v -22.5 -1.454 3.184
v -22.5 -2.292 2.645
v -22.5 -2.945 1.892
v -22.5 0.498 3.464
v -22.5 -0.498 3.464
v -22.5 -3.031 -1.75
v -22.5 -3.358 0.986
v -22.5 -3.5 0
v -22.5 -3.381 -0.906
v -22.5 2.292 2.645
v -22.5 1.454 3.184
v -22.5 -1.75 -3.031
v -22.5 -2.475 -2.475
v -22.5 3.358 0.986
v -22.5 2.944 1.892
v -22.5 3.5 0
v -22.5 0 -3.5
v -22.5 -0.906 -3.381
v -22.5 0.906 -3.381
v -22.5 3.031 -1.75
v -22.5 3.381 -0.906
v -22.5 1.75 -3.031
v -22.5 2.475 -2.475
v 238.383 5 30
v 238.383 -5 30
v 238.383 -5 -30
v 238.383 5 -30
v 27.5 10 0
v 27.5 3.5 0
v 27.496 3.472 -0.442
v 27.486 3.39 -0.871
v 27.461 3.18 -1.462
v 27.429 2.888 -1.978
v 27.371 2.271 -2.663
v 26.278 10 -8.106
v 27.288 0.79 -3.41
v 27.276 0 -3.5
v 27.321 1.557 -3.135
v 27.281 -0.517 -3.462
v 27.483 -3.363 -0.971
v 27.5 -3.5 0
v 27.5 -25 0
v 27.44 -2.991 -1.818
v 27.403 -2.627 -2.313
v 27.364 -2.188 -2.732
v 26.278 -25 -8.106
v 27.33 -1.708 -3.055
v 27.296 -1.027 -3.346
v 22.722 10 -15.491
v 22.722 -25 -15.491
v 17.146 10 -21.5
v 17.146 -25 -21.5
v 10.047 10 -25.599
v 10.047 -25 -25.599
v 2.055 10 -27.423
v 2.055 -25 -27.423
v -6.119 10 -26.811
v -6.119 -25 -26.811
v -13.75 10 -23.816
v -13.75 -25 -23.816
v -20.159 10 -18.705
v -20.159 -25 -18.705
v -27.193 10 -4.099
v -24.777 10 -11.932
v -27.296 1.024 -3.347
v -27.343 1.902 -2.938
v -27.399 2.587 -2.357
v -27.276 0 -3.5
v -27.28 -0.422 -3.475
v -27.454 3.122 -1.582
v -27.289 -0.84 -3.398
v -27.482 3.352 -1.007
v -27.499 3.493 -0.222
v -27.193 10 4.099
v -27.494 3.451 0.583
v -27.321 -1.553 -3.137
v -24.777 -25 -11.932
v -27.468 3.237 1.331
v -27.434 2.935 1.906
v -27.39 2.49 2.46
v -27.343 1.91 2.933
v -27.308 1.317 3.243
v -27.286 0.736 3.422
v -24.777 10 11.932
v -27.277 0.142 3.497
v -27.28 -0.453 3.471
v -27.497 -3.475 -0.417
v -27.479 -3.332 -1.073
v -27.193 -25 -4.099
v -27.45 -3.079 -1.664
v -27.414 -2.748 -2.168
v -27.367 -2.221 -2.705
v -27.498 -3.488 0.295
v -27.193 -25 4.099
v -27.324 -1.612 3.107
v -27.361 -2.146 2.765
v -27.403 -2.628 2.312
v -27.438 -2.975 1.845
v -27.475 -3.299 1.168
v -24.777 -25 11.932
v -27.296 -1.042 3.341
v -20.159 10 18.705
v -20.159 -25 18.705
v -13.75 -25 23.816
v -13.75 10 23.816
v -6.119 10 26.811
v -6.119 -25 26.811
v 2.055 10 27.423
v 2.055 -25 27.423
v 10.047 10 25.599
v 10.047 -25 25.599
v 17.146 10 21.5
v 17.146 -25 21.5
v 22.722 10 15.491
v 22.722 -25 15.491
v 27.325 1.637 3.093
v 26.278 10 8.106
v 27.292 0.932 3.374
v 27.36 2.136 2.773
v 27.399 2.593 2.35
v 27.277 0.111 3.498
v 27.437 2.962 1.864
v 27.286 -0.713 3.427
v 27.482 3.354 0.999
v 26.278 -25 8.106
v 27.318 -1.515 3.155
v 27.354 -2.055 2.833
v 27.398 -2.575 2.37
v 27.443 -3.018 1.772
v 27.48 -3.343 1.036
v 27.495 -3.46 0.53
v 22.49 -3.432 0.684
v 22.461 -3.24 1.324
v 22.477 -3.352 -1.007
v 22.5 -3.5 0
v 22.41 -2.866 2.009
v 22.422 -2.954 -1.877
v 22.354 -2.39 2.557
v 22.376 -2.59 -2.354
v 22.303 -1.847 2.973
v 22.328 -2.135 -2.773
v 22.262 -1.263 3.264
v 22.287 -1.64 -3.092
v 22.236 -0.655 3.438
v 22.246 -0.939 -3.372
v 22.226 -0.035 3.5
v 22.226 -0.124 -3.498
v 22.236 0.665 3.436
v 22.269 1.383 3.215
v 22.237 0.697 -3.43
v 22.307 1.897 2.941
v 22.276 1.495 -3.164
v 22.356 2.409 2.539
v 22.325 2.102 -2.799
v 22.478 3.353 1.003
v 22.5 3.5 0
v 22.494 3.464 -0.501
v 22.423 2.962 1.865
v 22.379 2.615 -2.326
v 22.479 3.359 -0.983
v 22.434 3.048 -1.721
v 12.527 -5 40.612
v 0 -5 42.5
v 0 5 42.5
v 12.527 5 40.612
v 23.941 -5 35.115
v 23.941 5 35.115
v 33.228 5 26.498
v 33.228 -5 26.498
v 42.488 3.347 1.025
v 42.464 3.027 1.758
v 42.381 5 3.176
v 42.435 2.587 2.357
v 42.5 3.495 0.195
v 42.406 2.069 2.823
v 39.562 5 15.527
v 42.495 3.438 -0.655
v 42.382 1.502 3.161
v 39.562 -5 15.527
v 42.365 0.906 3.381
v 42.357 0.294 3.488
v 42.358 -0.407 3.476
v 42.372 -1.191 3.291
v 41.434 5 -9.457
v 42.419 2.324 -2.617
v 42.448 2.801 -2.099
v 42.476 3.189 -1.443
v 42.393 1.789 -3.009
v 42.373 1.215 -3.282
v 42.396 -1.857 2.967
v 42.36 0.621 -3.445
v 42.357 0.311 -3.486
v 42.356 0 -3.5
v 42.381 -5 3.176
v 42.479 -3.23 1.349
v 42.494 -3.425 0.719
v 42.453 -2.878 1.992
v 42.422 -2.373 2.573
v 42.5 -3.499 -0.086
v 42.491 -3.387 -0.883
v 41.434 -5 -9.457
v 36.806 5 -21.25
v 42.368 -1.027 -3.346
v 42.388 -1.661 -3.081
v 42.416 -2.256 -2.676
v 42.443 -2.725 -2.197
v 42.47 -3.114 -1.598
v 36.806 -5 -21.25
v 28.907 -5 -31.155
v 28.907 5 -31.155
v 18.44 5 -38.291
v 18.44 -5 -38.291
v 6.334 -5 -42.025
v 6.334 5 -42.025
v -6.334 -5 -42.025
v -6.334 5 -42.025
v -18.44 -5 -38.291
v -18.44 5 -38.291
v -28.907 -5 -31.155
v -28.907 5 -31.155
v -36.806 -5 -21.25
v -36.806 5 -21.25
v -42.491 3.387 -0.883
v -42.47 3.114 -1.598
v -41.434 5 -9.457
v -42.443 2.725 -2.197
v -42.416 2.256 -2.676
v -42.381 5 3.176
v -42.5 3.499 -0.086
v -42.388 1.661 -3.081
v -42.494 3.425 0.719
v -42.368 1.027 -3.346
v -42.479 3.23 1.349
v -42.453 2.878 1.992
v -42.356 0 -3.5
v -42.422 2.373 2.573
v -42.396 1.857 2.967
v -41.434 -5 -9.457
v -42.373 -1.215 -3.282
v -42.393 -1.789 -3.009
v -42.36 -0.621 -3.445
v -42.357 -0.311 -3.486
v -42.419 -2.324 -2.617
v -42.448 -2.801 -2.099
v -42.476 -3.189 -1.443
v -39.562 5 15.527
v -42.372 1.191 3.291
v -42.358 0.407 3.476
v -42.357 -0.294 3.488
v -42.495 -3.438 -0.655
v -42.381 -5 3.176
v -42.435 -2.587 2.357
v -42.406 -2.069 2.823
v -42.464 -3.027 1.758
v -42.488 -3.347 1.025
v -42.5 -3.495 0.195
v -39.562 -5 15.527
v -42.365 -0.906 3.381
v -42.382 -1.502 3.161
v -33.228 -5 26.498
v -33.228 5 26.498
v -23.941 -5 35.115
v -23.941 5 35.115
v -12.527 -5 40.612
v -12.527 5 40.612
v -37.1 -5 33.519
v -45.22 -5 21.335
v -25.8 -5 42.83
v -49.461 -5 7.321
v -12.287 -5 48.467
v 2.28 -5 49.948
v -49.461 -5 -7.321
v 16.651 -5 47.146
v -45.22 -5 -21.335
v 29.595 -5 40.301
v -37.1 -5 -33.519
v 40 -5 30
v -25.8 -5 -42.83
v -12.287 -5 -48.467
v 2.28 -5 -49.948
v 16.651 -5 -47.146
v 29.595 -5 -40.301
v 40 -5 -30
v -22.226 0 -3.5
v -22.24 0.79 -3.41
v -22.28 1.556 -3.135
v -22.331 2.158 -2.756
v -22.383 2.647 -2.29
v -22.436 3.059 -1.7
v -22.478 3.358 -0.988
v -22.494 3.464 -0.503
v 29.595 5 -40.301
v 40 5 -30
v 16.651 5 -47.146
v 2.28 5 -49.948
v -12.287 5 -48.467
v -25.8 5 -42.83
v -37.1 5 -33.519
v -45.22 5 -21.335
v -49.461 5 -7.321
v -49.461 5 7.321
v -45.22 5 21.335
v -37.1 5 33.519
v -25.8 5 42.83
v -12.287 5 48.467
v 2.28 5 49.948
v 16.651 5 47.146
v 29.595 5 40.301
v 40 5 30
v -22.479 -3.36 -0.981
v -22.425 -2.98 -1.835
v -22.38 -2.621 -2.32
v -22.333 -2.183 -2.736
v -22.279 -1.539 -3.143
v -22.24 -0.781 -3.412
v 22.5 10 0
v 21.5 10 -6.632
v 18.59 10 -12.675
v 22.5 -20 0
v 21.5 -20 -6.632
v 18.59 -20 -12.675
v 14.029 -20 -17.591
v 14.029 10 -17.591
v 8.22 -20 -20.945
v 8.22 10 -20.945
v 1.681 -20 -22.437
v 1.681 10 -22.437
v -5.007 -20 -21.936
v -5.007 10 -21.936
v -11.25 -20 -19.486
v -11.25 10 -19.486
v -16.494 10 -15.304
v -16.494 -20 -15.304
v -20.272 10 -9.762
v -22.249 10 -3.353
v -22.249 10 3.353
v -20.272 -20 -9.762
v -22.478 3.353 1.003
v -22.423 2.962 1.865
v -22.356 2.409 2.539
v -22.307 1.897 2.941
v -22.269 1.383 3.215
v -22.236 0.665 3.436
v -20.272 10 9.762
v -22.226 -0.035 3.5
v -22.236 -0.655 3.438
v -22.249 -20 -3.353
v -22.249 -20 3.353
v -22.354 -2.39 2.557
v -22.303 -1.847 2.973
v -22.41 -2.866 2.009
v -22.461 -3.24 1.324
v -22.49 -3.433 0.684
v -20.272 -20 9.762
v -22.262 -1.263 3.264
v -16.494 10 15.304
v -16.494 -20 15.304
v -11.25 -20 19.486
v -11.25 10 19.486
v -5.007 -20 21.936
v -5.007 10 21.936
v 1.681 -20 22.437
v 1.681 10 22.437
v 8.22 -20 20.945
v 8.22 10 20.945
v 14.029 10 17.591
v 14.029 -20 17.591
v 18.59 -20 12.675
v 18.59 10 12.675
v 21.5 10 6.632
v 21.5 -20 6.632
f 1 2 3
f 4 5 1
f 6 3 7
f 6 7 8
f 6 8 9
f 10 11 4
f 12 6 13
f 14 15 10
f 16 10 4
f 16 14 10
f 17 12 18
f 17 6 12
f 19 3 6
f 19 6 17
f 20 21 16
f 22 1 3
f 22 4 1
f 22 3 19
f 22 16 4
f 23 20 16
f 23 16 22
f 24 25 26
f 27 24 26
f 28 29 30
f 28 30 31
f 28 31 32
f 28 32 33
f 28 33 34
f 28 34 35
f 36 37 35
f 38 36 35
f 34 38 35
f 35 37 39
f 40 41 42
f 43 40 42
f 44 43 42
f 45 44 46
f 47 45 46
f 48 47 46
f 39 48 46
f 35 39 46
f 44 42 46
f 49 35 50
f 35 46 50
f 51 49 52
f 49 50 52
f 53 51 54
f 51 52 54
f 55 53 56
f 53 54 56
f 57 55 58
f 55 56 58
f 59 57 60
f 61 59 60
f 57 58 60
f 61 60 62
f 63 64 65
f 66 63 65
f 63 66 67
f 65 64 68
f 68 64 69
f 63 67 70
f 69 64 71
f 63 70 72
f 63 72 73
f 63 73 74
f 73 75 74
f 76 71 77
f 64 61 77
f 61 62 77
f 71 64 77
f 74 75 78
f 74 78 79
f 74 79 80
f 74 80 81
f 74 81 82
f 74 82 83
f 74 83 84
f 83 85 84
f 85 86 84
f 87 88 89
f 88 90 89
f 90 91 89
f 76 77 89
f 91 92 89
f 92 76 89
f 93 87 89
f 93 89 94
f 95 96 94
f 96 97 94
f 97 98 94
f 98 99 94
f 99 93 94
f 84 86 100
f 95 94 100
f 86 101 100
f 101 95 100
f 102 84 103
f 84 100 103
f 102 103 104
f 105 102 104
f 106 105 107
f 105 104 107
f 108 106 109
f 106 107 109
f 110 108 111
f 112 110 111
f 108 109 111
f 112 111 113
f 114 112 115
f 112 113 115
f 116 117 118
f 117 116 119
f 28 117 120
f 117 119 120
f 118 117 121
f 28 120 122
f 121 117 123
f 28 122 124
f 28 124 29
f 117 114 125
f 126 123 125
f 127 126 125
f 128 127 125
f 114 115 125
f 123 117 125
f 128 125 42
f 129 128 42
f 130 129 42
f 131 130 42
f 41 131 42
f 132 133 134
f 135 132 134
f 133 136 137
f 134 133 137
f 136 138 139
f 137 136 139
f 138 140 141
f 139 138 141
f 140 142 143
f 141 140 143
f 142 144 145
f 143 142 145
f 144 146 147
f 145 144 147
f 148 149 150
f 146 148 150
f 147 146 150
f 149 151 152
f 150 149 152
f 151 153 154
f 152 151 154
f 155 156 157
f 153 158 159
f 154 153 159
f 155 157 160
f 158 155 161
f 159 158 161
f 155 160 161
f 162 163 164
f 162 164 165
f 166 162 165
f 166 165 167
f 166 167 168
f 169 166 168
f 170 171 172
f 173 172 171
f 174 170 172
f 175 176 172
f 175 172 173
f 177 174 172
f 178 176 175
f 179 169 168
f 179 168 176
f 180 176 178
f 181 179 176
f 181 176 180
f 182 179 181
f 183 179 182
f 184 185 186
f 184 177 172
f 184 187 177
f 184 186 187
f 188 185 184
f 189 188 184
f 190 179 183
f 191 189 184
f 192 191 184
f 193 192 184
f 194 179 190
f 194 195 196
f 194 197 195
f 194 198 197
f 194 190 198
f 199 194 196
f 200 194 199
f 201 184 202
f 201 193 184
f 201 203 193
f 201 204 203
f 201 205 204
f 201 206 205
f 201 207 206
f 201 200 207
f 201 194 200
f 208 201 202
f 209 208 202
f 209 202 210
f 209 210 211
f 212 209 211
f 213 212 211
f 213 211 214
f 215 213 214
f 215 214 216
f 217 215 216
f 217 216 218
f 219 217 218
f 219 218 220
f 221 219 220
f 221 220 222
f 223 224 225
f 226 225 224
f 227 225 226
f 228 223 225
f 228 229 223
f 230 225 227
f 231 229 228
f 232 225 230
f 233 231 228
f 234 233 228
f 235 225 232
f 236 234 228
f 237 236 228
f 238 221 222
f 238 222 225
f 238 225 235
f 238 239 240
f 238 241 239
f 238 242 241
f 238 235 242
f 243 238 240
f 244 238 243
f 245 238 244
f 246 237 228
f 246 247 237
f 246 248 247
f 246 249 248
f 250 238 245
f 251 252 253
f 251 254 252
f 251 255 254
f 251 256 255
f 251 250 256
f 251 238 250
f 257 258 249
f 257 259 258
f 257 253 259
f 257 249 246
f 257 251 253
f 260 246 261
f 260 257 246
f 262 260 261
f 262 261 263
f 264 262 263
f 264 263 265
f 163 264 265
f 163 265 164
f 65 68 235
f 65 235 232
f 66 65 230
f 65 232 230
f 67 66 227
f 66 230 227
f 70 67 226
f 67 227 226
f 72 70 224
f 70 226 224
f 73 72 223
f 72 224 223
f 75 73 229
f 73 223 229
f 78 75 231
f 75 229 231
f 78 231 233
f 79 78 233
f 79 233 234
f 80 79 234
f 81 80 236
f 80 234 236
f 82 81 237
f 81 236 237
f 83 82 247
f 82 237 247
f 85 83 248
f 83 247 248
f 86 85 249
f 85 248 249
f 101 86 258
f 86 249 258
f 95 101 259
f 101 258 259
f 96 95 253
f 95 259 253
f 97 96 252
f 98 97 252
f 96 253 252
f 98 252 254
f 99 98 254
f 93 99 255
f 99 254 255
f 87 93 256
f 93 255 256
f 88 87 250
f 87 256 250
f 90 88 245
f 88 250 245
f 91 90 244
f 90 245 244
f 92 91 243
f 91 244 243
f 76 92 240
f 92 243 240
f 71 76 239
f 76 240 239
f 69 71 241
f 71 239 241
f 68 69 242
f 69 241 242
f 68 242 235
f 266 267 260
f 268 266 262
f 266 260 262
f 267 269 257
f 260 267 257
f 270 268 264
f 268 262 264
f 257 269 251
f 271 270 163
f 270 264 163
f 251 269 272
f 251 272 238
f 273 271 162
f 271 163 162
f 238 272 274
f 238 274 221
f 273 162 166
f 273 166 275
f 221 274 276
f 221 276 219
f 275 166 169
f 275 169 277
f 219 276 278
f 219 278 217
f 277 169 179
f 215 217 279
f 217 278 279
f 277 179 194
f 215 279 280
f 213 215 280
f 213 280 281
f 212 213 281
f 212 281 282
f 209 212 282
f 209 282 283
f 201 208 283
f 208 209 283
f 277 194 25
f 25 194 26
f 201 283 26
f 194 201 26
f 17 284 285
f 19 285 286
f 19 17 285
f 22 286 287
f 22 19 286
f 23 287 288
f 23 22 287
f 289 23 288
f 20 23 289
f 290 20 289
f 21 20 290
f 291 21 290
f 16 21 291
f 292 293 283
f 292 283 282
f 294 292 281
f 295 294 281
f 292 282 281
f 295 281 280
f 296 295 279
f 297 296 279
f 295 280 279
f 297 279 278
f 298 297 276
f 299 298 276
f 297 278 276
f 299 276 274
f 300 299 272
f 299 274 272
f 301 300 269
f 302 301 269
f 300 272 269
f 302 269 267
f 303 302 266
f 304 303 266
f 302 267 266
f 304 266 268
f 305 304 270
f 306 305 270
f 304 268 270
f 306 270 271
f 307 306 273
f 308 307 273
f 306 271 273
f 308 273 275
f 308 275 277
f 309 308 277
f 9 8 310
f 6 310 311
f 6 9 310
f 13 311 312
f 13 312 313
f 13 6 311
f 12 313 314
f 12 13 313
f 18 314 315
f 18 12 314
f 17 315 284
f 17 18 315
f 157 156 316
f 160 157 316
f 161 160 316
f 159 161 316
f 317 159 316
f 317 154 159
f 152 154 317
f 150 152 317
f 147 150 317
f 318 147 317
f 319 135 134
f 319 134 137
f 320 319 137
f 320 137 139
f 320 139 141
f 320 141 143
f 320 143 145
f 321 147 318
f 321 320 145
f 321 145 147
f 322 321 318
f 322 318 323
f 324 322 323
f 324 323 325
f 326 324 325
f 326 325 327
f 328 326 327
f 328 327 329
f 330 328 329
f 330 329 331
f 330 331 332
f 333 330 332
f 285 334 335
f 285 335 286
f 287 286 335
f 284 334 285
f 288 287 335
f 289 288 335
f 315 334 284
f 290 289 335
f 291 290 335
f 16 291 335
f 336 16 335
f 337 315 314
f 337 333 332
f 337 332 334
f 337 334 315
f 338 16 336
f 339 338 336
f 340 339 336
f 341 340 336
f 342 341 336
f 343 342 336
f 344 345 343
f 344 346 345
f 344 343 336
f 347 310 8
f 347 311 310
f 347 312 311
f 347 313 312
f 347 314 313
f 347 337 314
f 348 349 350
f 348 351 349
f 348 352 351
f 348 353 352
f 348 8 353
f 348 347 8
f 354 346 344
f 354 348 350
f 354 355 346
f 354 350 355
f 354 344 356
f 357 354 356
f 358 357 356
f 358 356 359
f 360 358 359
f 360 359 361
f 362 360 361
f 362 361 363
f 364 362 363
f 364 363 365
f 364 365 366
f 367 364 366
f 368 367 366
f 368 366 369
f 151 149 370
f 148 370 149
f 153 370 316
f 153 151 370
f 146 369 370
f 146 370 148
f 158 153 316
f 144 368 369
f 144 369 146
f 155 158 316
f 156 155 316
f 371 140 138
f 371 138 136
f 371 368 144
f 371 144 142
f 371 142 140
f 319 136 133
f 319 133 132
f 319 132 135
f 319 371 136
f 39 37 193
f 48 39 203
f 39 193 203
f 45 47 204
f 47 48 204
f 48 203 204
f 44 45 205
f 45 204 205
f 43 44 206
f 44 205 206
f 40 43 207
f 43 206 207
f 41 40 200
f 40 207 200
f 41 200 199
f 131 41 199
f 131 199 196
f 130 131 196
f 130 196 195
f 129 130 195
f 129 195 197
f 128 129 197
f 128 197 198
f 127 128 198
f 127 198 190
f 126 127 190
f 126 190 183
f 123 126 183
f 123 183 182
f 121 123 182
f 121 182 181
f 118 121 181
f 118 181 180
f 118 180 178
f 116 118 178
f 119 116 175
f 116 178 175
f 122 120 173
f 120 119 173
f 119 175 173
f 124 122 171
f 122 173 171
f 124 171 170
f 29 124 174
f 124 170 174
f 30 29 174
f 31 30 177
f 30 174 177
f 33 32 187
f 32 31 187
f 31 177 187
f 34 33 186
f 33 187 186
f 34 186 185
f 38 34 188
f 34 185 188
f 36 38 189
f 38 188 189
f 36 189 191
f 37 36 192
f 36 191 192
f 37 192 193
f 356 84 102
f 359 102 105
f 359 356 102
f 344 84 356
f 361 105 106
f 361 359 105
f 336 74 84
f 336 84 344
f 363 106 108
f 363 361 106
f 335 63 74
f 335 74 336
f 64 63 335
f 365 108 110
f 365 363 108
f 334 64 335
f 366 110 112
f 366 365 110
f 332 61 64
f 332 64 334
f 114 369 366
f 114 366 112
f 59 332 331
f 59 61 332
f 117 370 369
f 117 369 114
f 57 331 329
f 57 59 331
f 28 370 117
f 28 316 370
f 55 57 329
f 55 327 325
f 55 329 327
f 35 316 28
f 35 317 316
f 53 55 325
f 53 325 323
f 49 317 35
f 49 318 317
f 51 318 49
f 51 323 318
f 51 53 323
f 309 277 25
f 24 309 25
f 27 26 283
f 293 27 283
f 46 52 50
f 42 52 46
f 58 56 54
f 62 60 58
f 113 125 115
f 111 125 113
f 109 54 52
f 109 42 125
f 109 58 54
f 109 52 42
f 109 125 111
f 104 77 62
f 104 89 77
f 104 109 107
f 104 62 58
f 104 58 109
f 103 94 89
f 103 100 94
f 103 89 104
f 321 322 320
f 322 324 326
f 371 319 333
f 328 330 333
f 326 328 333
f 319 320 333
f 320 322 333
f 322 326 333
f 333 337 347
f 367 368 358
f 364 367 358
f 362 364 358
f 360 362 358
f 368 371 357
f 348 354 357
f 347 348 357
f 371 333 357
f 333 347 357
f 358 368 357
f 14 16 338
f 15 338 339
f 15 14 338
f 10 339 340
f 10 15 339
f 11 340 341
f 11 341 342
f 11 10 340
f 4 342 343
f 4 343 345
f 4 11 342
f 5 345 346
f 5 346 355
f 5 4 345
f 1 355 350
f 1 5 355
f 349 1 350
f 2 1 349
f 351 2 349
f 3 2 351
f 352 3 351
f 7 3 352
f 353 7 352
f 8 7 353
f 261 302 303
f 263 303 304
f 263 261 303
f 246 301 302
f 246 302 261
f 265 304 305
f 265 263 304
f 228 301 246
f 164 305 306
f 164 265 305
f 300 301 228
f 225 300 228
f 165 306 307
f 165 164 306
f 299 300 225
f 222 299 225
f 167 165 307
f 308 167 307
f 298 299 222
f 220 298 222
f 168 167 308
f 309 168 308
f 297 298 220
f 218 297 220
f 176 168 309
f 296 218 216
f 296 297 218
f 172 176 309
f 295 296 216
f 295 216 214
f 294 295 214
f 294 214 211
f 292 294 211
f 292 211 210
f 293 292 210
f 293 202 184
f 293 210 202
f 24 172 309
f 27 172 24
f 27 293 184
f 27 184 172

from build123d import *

# Parameters (mm, degrees)
EXTRUDE_THIN1_DEPTH      = 10
EXTRUDE_THIN1_DEPTH_BACK = 25
SKETCH1_R                = 27.5
SKETCH1_R_2              = 22.5
SKETCH3_R                = 22.5
BOSS_EXTRUDE1_DEPTH      = 5
BOSS_EXTRUDE2_DEPTH      = 5
BOSS_EXTRUDE2_DEPTH_BACK = 5
SKETCH1_4_R              = 50
SKETCH1_4_R_2            = 42.5
CUT_EXTRUDE1_REACH       = 220.167
CUT_EXTRUDE1_END_RADIUS  = 22.5
SKETCH5_R                = 3.5
BOSS_EXTRUDE3_REACH      = 205.704
BOSS_EXTRUDE3_END_RADIUS = 22.5
SKETCH6_R                = 3.5
SKETCH7_R                = 3.5
BOSS_EXTRUDE5_DEPTH      = 20


with BuildPart() as part:
    # Sketch1 → Extrude-Thin1 (new, two sides: drawn at the far end of the back side and taken through both)
    with BuildSketch(Plane(origin=(0, 0, 0), x_dir=(1, 0, 0), z_dir=(0, 1, 0)).offset(-EXTRUDE_THIN1_DEPTH_BACK)):
        Circle(SKETCH1_R)
        Circle(SKETCH1_R_2, mode=Mode.SUBTRACT)
    extrude(amount=EXTRUDE_THIN1_DEPTH + EXTRUDE_THIN1_DEPTH_BACK)

    # Sketch3 → Boss-Extrude1 (add)
    with BuildSketch(Plane.XZ.offset(25)):
        with Locations(Location((0, 0, 0), (0, 0, 90))):
            Circle(SKETCH3_R)
    extrude(amount=-BOSS_EXTRUDE1_DEPTH)

    # Cut-Extrude1: up to this cylinder (the profile starts outside it)
    cut_extrude1_end = Plane(origin=(0, 0, 0), z_dir=(0, 1, 0)) * Cylinder(CUT_EXTRUDE1_END_RADIUS, 486.334, mode=Mode.PRIVATE)
    # Sketch5 → Cut-Extrude1 (cut, up to the surface)
    with BuildSketch(Plane(origin=(27.5, 0, 0), x_dir=(0, 0, -1), z_dir=(1, 0, 0)), mode=Mode.PRIVATE) as cut_extrude1_sk1:
        Circle(SKETCH5_R)
    cut_extrude1_tool1 = extrude(cut_extrude1_sk1.sketch, amount=-CUT_EXTRUDE1_REACH, mode=Mode.PRIVATE) - cut_extrude1_end
    cut_extrude1 = cut_extrude1_tool1.solids().sort_by_distance((27.5, 0, 0))[0]
    add(cut_extrude1, mode=Mode.SUBTRACT)

    # Mirror1: Cut-Extrude1 across plane
    add(cut_extrude1.mirror(Plane(origin=(0, 0, 0), x_dir=(0, 0, 1), z_dir=(1, 0, 0))), mode=Mode.SUBTRACT)



with BuildPart() as body_2:
    # Sketch1<4> → Boss-Extrude2 (new, two sides: drawn at the far end of the back side and taken through both)
    # profile 1 of 2: a face of its own
    with BuildSketch(Plane(origin=(0, 0, 0), x_dir=(1, 0, 0), z_dir=(0, 1, 0)).offset(-BOSS_EXTRUDE2_DEPTH_BACK)):
        Circle(SKETCH1_4_R)
        with Locations(Location((0, 0, 0), (0, 0, 270))):
            Circle(SKETCH1_4_R_2, mode=Mode.SUBTRACT)
    # profile 2 of 2: a face of its own
    with BuildSketch(Plane(origin=(0, 0, 0), x_dir=(1, 0, 0), z_dir=(0, 1, 0)).offset(-BOSS_EXTRUDE2_DEPTH_BACK)):
        with BuildLine():
            ThreePointArc((50, 0), (47.434164903, -15.811388301), (40, -30))
            Line((40, -30), (238.383087675, -30))
            Line((238.383087675, -30), (238.383087675, 30))
            Line((238.383087675, 30), (40, 30))
            ThreePointArc((40, 30), (47.434164903, 15.811388301), (50, 0))
        make_face()
    extrude(amount=BOSS_EXTRUDE2_DEPTH + BOSS_EXTRUDE2_DEPTH_BACK)


with BuildPart() as part_1:
    add(part.part)

    add(body_2.part)  # Boss-Extrude3 merges body 2
    # Boss-Extrude3: up to this cylinder (the profile starts outside it)
    boss_extrude3_end = Plane(origin=(0, 0, 0), z_dir=(0, 1, 0)) * Cylinder(BOSS_EXTRUDE3_END_RADIUS, 457.408, mode=Mode.PRIVATE)
    # Sketch6 → Boss-Extrude3 (add, up to the surface)
    with BuildSketch(Plane.ZY.offset(-42.5), mode=Mode.PRIVATE) as boss_extrude3_sk1:
        with Locations(Location((0, 0, 0), (0, 0, 180))):
            Circle(SKETCH6_R)
    boss_extrude3_tool1 = extrude(boss_extrude3_sk1.sketch, amount=BOSS_EXTRUDE3_REACH, mode=Mode.PRIVATE) - boss_extrude3_end
    add(boss_extrude3_tool1.solids().sort_by_distance((42.5, 0, 0))[0])

    # Sketch7 → Boss-Extrude5 (add)
    with BuildSketch(Plane(origin=(-42.5, 0, 0), x_dir=(0, 0, -1), z_dir=(1, 0, 0))):
        Circle(SKETCH7_R)
    extrude(amount=BOSS_EXTRUDE5_DEPTH)


solid = part_1.part
